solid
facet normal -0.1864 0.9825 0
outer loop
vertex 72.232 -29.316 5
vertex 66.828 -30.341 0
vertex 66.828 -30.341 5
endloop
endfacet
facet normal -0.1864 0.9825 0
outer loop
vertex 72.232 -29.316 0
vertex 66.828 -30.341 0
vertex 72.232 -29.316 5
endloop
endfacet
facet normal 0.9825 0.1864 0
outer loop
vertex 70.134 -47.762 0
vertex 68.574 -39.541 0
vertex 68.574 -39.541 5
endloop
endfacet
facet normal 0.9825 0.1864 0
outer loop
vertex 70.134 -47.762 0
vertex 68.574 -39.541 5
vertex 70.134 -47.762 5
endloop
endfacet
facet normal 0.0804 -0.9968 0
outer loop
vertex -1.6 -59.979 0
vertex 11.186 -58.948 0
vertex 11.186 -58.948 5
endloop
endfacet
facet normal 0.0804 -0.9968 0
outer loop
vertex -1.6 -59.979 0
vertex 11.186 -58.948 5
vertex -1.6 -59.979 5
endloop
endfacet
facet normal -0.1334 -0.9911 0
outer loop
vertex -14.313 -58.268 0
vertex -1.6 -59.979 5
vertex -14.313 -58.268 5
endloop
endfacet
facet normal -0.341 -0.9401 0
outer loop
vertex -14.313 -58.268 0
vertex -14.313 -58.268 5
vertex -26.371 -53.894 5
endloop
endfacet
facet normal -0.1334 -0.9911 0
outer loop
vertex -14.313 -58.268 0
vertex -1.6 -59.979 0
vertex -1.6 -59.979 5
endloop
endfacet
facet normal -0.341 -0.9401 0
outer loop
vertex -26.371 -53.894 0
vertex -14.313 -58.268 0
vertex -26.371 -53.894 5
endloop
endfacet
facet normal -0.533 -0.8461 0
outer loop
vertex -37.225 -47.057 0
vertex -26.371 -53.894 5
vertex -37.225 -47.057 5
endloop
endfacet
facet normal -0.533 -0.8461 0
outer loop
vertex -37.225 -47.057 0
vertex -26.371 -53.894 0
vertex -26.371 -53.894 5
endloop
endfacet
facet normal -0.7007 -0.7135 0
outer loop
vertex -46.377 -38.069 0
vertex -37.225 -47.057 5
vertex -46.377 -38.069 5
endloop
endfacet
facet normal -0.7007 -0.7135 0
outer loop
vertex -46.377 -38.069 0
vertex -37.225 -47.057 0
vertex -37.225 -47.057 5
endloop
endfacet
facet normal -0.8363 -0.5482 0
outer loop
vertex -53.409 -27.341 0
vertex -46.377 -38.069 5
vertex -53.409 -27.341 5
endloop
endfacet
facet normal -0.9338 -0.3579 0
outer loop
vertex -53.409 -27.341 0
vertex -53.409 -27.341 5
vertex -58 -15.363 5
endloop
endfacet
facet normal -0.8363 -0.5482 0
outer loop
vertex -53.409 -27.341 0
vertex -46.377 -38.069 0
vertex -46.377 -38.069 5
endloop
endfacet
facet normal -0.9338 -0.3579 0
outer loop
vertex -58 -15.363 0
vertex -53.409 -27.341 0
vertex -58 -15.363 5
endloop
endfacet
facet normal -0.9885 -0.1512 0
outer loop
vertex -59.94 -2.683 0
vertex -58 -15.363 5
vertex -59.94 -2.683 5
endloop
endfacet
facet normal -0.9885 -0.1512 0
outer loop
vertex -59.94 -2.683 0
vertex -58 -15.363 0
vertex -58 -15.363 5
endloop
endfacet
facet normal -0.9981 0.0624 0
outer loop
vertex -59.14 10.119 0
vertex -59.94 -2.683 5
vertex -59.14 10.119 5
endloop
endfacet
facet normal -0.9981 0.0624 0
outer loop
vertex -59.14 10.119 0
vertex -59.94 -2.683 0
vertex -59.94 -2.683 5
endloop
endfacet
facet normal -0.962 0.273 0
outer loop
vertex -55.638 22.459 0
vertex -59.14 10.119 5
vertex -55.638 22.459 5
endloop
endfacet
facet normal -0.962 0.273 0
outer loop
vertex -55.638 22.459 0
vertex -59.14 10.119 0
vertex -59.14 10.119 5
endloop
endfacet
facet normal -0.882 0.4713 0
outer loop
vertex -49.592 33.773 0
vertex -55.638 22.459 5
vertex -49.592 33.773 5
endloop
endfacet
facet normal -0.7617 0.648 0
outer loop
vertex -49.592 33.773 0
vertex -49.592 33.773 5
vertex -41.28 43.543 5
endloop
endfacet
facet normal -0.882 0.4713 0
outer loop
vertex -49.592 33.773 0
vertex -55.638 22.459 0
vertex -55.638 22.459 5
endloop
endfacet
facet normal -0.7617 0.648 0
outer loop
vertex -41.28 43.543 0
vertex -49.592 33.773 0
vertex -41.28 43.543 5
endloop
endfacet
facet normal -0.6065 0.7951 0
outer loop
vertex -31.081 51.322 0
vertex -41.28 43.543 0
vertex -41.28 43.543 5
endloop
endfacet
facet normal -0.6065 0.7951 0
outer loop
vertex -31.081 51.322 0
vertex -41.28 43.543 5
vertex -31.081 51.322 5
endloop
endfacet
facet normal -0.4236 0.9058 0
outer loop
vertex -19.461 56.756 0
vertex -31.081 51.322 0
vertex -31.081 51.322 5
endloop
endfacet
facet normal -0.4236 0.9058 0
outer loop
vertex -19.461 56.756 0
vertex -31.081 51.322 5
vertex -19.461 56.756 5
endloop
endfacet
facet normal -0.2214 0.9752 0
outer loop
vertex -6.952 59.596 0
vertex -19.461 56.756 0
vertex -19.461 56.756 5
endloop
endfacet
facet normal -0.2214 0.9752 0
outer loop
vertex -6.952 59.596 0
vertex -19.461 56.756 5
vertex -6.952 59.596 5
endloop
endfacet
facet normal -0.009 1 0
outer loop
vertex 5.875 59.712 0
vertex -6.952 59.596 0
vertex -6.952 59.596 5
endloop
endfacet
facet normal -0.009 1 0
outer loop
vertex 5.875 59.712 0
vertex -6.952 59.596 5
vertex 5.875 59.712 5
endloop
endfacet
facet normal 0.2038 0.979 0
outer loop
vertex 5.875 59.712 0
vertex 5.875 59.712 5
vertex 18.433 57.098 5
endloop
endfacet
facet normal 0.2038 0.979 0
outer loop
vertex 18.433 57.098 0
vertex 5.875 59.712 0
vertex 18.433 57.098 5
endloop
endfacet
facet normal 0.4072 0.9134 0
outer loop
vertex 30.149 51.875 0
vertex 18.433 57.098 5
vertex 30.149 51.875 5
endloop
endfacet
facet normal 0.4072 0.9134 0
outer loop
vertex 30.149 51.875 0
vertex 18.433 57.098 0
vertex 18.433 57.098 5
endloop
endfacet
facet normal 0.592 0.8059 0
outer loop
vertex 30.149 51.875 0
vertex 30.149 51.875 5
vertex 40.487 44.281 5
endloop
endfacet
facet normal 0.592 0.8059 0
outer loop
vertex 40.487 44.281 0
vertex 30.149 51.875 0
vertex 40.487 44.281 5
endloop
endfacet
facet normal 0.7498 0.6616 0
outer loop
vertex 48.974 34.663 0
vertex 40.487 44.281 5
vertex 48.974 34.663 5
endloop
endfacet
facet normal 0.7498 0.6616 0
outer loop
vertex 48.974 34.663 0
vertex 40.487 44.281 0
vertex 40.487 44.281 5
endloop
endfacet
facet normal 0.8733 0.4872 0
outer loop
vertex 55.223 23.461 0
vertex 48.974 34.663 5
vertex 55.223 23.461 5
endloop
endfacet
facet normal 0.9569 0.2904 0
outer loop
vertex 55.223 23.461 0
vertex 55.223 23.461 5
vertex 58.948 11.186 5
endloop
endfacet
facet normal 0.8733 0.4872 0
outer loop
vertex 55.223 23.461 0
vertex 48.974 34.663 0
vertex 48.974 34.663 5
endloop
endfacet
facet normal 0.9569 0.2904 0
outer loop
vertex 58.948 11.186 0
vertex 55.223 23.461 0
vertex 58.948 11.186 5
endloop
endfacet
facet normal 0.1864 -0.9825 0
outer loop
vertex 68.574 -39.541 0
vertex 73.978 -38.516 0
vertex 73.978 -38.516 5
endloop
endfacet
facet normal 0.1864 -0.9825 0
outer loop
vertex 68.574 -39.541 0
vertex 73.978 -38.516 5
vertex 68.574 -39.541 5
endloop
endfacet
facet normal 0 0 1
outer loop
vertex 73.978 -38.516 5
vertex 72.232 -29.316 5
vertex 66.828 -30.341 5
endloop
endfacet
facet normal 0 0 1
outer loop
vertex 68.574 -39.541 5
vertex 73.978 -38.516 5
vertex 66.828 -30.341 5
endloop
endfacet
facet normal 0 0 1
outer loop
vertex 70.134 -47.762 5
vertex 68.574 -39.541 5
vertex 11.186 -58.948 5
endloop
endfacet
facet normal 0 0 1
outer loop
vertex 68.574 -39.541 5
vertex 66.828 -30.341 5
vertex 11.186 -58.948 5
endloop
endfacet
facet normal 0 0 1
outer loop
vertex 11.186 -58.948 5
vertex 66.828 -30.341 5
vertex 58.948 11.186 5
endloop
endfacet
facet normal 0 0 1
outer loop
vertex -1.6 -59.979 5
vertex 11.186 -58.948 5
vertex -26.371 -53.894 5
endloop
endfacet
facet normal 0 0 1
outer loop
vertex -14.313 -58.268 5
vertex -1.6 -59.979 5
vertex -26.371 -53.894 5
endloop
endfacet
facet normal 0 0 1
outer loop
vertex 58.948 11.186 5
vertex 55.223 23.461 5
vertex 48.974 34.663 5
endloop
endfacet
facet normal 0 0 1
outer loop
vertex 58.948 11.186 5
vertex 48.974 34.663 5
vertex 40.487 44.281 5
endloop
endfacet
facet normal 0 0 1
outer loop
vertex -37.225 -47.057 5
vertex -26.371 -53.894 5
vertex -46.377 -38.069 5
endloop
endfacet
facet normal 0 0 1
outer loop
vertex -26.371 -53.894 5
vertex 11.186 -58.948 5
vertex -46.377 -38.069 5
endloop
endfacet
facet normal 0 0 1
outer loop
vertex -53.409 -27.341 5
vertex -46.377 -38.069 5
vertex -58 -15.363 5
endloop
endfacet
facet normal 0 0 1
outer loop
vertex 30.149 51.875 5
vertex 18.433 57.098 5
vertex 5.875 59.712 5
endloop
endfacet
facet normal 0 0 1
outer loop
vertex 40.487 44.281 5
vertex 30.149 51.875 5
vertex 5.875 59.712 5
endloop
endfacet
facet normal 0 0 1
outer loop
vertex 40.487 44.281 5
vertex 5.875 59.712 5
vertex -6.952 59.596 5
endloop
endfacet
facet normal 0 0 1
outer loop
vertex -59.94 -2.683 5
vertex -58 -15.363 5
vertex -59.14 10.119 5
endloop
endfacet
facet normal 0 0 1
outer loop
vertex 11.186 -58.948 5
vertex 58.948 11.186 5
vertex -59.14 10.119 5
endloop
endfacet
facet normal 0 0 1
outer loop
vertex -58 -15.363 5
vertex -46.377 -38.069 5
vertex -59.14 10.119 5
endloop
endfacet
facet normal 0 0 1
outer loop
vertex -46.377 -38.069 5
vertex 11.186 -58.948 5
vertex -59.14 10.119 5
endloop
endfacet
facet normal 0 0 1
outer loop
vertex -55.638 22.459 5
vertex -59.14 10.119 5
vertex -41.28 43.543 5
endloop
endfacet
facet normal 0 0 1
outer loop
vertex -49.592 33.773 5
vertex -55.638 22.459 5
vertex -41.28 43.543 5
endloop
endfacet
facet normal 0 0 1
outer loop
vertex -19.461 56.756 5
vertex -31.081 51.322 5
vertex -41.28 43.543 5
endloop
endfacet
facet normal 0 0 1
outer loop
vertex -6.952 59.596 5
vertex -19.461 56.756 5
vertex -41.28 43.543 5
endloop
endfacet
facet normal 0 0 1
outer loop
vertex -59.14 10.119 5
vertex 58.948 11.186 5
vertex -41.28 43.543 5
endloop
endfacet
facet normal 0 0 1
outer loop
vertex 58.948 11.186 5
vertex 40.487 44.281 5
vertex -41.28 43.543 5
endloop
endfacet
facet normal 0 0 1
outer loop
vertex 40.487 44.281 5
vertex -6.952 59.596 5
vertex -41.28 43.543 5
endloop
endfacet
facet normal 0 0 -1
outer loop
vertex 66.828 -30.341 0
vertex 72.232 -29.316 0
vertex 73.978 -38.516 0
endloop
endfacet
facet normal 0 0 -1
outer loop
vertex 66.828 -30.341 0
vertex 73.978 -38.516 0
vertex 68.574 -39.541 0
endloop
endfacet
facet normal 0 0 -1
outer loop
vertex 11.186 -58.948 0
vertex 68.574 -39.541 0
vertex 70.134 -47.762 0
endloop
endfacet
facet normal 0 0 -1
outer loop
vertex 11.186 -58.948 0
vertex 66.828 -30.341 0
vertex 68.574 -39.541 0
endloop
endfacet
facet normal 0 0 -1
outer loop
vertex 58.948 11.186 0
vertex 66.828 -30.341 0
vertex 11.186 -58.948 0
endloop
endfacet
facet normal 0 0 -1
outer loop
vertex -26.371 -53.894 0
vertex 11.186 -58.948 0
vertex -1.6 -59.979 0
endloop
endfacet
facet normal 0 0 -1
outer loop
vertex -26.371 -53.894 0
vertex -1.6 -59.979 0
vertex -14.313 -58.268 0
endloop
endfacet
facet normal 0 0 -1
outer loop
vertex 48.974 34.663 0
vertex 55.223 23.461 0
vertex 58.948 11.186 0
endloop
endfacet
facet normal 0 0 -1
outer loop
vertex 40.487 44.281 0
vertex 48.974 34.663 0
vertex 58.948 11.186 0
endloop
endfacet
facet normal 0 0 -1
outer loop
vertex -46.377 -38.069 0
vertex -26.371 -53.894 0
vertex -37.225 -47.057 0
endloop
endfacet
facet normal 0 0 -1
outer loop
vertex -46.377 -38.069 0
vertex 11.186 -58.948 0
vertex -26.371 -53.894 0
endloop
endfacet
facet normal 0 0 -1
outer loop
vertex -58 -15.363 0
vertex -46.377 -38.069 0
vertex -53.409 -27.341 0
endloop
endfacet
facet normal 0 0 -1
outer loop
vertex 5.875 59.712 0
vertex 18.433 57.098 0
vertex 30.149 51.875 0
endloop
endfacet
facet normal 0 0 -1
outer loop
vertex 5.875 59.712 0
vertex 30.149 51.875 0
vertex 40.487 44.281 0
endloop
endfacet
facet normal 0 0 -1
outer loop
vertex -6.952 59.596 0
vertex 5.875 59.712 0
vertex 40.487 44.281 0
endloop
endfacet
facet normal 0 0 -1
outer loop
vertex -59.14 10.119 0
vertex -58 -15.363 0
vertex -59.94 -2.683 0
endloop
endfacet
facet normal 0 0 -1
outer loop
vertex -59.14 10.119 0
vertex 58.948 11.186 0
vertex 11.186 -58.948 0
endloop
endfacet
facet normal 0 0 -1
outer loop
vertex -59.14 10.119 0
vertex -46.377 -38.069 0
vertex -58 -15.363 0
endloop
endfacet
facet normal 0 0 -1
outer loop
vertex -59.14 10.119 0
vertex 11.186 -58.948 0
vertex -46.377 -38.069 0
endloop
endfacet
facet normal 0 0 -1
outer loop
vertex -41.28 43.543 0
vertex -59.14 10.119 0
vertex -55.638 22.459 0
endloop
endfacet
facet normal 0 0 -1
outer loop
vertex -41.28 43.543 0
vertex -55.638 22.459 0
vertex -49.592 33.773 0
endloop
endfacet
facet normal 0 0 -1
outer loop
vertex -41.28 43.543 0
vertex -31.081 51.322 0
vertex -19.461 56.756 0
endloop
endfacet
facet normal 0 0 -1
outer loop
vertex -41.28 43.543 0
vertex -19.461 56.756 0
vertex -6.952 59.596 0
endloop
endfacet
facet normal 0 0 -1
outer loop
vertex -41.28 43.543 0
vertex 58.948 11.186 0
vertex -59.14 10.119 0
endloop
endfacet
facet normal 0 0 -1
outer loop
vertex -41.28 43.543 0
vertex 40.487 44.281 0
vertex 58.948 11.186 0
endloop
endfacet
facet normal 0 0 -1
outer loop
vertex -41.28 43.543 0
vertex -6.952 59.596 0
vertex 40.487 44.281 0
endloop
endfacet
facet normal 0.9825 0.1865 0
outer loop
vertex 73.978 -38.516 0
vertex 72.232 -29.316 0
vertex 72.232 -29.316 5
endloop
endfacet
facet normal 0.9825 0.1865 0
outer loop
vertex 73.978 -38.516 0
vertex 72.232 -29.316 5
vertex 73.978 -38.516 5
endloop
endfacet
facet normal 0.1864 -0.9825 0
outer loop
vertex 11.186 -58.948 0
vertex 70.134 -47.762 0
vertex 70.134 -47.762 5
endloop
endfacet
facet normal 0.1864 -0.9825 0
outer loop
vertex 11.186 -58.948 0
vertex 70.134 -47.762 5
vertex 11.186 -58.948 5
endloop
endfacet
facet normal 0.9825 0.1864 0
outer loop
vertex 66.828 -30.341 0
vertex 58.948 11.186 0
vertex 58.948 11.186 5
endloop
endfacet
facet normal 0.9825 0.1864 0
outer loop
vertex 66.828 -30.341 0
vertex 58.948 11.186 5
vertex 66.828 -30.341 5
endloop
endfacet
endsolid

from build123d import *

# Parameters (mm, degrees)
BOSS_EXTRUDE1_DEPTH = 5


with BuildPart() as part:
    # Sketch1 → Boss-Extrude1 (new body)
    with BuildSketch(Plane.XY):
        with BuildLine():
            Line((58.948050608, 11.186032786), (66.828328123, -30.341379713))
            Line((66.828328123, -30.341379713), (72.231899429, -29.315993374))
            Line((72.231899429, -29.315993374), (73.977656704, -38.515768682))
            Line((73.977656704, -38.515768682), (68.574085398, -39.541155021))
            Line((68.574085398, -39.541155021), (70.134083395, -47.762017822))
            Line((70.134083395, -47.762017822), (11.186032786, -58.948050608))
            ThreePointArc((11.186032786, -58.948050608), (-49.592285961, 33.772846685), (58.948050608, 11.186032786))
        make_face()
    extrude(amount=BOSS_EXTRUDE1_DEPTH)


solid = part.part
